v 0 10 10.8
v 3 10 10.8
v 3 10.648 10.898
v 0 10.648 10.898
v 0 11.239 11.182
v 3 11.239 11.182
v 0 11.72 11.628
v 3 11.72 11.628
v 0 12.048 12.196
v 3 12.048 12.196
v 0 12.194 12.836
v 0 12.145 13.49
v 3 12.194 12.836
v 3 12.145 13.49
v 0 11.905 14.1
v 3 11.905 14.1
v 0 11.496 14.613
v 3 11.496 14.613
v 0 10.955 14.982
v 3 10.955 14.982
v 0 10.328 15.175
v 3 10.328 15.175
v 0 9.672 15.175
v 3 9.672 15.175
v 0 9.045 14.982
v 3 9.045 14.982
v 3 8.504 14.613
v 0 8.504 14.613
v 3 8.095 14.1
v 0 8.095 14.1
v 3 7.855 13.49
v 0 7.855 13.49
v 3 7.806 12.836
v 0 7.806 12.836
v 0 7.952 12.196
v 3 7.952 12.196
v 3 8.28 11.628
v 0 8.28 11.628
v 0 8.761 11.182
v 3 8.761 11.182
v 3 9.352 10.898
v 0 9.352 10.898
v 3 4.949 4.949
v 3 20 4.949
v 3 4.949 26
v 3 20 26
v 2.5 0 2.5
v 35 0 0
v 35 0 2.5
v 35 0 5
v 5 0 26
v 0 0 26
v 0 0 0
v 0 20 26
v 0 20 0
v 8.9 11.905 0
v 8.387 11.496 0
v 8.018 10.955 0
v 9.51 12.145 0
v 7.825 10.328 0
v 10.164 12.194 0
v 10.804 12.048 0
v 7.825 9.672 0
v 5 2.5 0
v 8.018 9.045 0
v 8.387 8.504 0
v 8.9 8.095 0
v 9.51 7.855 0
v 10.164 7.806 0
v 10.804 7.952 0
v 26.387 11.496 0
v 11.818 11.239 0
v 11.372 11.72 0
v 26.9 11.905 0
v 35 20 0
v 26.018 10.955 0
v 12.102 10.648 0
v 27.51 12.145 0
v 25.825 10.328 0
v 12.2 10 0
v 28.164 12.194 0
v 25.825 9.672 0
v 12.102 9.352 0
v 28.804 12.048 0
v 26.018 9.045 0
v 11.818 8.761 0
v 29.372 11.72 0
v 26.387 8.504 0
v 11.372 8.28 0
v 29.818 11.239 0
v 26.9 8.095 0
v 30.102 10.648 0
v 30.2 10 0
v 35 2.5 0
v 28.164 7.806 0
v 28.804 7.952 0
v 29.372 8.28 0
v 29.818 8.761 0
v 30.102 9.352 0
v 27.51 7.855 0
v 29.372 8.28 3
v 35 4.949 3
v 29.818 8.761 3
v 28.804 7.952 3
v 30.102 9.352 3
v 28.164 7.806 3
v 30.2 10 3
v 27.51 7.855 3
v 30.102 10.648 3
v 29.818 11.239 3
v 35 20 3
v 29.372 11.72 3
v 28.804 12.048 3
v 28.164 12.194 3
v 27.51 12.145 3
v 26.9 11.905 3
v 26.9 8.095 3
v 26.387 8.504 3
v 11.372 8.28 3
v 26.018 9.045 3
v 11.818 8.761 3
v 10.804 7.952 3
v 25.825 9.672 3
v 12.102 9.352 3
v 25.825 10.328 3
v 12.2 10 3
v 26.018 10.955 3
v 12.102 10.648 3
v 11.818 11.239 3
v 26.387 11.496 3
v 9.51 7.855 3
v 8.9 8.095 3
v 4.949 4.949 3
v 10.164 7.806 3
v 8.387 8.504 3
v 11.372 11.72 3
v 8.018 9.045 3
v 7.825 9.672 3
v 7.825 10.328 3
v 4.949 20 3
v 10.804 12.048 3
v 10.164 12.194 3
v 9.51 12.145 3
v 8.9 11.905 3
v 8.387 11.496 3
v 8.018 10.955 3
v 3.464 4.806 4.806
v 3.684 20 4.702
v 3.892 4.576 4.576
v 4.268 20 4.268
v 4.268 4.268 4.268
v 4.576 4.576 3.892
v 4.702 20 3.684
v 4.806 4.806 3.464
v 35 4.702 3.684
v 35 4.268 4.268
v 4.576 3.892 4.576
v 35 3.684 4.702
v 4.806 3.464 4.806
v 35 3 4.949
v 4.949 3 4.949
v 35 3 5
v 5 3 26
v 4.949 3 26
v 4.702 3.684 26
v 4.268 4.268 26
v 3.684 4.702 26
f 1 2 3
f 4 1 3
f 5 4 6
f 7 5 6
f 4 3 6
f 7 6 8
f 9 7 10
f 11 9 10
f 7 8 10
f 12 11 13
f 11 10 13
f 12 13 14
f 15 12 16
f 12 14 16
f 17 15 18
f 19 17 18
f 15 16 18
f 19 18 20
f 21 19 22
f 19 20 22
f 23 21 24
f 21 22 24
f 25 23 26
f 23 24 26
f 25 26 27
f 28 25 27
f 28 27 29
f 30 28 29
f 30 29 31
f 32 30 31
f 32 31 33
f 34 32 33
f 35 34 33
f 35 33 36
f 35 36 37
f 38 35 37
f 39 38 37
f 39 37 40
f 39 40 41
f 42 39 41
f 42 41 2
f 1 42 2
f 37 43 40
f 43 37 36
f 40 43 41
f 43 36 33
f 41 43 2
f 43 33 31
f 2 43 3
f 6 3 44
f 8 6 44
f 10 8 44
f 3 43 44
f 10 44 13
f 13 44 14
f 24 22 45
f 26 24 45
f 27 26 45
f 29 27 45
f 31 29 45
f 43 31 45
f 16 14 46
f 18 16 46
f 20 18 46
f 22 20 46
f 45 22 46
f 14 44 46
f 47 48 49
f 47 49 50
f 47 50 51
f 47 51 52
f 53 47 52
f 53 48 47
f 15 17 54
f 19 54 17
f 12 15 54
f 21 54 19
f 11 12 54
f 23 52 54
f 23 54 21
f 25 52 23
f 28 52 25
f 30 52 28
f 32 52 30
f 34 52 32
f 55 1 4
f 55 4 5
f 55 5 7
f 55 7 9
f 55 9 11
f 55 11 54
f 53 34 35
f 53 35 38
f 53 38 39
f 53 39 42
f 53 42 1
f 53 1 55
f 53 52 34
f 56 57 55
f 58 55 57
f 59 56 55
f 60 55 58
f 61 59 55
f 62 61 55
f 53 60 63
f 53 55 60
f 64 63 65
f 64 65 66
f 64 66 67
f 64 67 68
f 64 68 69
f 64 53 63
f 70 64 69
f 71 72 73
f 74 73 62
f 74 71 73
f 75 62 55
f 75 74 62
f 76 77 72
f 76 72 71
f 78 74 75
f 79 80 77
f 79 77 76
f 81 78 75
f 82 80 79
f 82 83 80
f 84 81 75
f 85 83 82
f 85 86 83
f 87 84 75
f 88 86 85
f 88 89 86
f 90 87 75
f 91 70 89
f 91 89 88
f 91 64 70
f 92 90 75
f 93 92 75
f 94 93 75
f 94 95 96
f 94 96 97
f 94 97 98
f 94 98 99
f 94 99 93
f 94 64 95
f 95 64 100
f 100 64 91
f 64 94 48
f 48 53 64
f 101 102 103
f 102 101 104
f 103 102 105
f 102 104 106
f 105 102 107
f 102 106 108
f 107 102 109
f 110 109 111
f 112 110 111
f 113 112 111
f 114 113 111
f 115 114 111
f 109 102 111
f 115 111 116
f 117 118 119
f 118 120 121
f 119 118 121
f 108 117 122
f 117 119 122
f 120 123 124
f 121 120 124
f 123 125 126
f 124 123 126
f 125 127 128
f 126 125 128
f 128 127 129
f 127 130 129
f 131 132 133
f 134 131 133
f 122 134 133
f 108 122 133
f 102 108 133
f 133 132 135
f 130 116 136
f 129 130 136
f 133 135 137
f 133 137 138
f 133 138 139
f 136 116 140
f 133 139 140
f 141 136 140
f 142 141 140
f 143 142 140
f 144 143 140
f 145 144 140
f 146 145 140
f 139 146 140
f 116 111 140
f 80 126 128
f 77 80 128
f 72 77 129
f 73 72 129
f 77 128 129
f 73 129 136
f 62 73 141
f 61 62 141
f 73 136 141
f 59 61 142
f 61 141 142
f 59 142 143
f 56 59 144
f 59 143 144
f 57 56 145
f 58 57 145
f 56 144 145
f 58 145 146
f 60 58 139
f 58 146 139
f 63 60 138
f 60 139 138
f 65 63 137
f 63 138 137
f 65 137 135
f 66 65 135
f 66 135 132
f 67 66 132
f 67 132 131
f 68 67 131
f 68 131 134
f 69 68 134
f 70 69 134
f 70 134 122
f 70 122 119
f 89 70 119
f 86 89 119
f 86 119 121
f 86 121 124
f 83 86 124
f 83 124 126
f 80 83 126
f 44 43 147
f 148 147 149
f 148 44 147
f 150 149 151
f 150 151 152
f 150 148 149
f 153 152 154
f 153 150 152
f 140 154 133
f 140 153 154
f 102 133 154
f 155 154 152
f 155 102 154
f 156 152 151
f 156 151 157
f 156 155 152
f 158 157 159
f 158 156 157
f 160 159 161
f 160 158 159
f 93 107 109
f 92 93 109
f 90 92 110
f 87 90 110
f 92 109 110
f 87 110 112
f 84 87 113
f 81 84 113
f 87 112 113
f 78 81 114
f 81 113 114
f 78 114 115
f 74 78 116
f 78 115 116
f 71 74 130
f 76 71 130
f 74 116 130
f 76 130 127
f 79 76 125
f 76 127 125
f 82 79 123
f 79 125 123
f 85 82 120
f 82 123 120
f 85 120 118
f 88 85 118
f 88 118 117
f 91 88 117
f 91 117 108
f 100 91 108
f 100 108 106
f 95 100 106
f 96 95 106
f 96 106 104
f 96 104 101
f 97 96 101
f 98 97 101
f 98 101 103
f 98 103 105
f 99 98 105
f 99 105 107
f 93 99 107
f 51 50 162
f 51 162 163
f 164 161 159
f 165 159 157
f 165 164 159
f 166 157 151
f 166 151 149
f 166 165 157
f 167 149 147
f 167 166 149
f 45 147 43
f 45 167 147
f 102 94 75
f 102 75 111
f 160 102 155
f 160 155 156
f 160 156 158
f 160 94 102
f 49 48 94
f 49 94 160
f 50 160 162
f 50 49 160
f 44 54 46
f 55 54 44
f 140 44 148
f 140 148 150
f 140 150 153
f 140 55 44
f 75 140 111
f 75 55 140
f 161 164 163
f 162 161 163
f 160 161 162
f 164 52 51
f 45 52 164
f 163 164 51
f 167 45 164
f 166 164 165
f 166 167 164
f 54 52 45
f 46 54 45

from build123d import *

# Parameters (mm, degrees)
BOSS_EXTRUDE1_DEPTH      = 20
CUT_EXTRUDE1_DEPTH       = 17
BOSS_EXTRUDE2_REACH      = 49.969
SKETCH3_R                = 2.5
BOSS_EXTRUDE3_REACH      = 49.969
BOSS_EXTRUDE3_END_RADIUS = 2.5
SKETCH4_R                = 2.5
BOSS_EXTRUDE4_REACH      = 49.969
SKETCH5_R                = 2.5
SKETCH6_R                = 2.2
CUT_EXTRUDE2_DEPTH       = 47.411205543
SKETCH7_R                = 2.2
CUT_EXTRUDE3_DEPTH       = 46.82575695


with BuildPart() as part:
    # Sketch1 → Boss-Extrude1 (new body)
    with BuildSketch(Plane(origin=(0, 0, 0), x_dir=(1, 0, 0), z_dir=(0, 1, 0))):
        Polygon((0, 0), (35, 0), (35, -5), (5, -26), (0, -26), align=None)
    extrude(amount=BOSS_EXTRUDE1_DEPTH)

    # Sketch2 → Cut-Extrude1 (cut)
    with BuildSketch(Plane(origin=(0, 20, 0), x_dir=(1, 0, 0), z_dir=(0, 1, 0))):
        Polygon((35, -3), (3, -3), (3, -26), (5, -26), (35, -5), align=None)
    extrude(amount=-CUT_EXTRUDE1_DEPTH, mode=Mode.SUBTRACT)

    # Sketch3 → Boss-Extrude2 (add, up to next)
    with BuildSketch(Plane.XY.offset(26), mode=Mode.PRIVATE) as boss_extrude2_sk1:
        with Locations((2.5, 2.5)):
            Circle(SKETCH3_R)
    boss_extrude2_tool1 = extrude(boss_extrude2_sk1.sketch, amount=-BOSS_EXTRUDE2_REACH, mode=Mode.PRIVATE) - part.part
    add(boss_extrude2_tool1.solids().sort_by_distance((2.5, 2.5, 26))[0])

    # Boss-Extrude3: up to this cylinder (the profile starts outside it)
    boss_extrude3_end = Plane(origin=(2.5, 2.5, 2.5), z_dir=(0, 0, 1)) * Cylinder(BOSS_EXTRUDE3_END_RADIUS, 105.938, mode=Mode.PRIVATE)
    # Sketch4 → Boss-Extrude3 (add, up to the surface)
    with BuildSketch(Plane(origin=(35, 0, 0), x_dir=(0, 0, -1), z_dir=(1, 0, 0)), mode=Mode.PRIVATE) as boss_extrude3_sk1:
        with Locations((-2.5, 2.5)):
            Circle(SKETCH4_R)
    boss_extrude3_tool1 = extrude(boss_extrude3_sk1.sketch, amount=-BOSS_EXTRUDE3_REACH, mode=Mode.PRIVATE) - boss_extrude3_end
    add(boss_extrude3_tool1.solids().sort_by_distance((35, 2.5, 2.5))[0])

    # Sketch5 → Boss-Extrude4 (add, up to next)
    with BuildSketch(Plane(origin=(0, 20, 0), x_dir=(1, 0, 0), z_dir=(0, 1, 0)), mode=Mode.PRIVATE) as boss_extrude4_sk1:
        with Locations((2.5, -2.5)):
            Circle(SKETCH5_R)
    boss_extrude4_tool1 = extrude(boss_extrude4_sk1.sketch, amount=-BOSS_EXTRUDE4_REACH, mode=Mode.PRIVATE) - part.part
    add(boss_extrude4_tool1.solids().sort_by_distance((2.5, 20, 2.5))[0])

    # Sketch6 → Cut-Extrude2 (cut, through all)
    with BuildSketch(Plane.XY.offset(3)):
        with Locations((10, 10)):
            Circle(SKETCH6_R)
        with Locations((28, 10)):
            Circle(SKETCH6_R)
    extrude(amount=-CUT_EXTRUDE2_DEPTH, mode=Mode.SUBTRACT)

    # Sketch7 → Cut-Extrude3 (cut, through all)
    with BuildSketch(Plane(origin=(3, 0, 0), x_dir=(0, 0, -1), z_dir=(1, 0, 0))):
        with Locations((-13, 10)):
            Circle(SKETCH7_R)
    extrude(amount=-CUT_EXTRUDE3_DEPTH, mode=Mode.SUBTRACT)


solid = part.part
